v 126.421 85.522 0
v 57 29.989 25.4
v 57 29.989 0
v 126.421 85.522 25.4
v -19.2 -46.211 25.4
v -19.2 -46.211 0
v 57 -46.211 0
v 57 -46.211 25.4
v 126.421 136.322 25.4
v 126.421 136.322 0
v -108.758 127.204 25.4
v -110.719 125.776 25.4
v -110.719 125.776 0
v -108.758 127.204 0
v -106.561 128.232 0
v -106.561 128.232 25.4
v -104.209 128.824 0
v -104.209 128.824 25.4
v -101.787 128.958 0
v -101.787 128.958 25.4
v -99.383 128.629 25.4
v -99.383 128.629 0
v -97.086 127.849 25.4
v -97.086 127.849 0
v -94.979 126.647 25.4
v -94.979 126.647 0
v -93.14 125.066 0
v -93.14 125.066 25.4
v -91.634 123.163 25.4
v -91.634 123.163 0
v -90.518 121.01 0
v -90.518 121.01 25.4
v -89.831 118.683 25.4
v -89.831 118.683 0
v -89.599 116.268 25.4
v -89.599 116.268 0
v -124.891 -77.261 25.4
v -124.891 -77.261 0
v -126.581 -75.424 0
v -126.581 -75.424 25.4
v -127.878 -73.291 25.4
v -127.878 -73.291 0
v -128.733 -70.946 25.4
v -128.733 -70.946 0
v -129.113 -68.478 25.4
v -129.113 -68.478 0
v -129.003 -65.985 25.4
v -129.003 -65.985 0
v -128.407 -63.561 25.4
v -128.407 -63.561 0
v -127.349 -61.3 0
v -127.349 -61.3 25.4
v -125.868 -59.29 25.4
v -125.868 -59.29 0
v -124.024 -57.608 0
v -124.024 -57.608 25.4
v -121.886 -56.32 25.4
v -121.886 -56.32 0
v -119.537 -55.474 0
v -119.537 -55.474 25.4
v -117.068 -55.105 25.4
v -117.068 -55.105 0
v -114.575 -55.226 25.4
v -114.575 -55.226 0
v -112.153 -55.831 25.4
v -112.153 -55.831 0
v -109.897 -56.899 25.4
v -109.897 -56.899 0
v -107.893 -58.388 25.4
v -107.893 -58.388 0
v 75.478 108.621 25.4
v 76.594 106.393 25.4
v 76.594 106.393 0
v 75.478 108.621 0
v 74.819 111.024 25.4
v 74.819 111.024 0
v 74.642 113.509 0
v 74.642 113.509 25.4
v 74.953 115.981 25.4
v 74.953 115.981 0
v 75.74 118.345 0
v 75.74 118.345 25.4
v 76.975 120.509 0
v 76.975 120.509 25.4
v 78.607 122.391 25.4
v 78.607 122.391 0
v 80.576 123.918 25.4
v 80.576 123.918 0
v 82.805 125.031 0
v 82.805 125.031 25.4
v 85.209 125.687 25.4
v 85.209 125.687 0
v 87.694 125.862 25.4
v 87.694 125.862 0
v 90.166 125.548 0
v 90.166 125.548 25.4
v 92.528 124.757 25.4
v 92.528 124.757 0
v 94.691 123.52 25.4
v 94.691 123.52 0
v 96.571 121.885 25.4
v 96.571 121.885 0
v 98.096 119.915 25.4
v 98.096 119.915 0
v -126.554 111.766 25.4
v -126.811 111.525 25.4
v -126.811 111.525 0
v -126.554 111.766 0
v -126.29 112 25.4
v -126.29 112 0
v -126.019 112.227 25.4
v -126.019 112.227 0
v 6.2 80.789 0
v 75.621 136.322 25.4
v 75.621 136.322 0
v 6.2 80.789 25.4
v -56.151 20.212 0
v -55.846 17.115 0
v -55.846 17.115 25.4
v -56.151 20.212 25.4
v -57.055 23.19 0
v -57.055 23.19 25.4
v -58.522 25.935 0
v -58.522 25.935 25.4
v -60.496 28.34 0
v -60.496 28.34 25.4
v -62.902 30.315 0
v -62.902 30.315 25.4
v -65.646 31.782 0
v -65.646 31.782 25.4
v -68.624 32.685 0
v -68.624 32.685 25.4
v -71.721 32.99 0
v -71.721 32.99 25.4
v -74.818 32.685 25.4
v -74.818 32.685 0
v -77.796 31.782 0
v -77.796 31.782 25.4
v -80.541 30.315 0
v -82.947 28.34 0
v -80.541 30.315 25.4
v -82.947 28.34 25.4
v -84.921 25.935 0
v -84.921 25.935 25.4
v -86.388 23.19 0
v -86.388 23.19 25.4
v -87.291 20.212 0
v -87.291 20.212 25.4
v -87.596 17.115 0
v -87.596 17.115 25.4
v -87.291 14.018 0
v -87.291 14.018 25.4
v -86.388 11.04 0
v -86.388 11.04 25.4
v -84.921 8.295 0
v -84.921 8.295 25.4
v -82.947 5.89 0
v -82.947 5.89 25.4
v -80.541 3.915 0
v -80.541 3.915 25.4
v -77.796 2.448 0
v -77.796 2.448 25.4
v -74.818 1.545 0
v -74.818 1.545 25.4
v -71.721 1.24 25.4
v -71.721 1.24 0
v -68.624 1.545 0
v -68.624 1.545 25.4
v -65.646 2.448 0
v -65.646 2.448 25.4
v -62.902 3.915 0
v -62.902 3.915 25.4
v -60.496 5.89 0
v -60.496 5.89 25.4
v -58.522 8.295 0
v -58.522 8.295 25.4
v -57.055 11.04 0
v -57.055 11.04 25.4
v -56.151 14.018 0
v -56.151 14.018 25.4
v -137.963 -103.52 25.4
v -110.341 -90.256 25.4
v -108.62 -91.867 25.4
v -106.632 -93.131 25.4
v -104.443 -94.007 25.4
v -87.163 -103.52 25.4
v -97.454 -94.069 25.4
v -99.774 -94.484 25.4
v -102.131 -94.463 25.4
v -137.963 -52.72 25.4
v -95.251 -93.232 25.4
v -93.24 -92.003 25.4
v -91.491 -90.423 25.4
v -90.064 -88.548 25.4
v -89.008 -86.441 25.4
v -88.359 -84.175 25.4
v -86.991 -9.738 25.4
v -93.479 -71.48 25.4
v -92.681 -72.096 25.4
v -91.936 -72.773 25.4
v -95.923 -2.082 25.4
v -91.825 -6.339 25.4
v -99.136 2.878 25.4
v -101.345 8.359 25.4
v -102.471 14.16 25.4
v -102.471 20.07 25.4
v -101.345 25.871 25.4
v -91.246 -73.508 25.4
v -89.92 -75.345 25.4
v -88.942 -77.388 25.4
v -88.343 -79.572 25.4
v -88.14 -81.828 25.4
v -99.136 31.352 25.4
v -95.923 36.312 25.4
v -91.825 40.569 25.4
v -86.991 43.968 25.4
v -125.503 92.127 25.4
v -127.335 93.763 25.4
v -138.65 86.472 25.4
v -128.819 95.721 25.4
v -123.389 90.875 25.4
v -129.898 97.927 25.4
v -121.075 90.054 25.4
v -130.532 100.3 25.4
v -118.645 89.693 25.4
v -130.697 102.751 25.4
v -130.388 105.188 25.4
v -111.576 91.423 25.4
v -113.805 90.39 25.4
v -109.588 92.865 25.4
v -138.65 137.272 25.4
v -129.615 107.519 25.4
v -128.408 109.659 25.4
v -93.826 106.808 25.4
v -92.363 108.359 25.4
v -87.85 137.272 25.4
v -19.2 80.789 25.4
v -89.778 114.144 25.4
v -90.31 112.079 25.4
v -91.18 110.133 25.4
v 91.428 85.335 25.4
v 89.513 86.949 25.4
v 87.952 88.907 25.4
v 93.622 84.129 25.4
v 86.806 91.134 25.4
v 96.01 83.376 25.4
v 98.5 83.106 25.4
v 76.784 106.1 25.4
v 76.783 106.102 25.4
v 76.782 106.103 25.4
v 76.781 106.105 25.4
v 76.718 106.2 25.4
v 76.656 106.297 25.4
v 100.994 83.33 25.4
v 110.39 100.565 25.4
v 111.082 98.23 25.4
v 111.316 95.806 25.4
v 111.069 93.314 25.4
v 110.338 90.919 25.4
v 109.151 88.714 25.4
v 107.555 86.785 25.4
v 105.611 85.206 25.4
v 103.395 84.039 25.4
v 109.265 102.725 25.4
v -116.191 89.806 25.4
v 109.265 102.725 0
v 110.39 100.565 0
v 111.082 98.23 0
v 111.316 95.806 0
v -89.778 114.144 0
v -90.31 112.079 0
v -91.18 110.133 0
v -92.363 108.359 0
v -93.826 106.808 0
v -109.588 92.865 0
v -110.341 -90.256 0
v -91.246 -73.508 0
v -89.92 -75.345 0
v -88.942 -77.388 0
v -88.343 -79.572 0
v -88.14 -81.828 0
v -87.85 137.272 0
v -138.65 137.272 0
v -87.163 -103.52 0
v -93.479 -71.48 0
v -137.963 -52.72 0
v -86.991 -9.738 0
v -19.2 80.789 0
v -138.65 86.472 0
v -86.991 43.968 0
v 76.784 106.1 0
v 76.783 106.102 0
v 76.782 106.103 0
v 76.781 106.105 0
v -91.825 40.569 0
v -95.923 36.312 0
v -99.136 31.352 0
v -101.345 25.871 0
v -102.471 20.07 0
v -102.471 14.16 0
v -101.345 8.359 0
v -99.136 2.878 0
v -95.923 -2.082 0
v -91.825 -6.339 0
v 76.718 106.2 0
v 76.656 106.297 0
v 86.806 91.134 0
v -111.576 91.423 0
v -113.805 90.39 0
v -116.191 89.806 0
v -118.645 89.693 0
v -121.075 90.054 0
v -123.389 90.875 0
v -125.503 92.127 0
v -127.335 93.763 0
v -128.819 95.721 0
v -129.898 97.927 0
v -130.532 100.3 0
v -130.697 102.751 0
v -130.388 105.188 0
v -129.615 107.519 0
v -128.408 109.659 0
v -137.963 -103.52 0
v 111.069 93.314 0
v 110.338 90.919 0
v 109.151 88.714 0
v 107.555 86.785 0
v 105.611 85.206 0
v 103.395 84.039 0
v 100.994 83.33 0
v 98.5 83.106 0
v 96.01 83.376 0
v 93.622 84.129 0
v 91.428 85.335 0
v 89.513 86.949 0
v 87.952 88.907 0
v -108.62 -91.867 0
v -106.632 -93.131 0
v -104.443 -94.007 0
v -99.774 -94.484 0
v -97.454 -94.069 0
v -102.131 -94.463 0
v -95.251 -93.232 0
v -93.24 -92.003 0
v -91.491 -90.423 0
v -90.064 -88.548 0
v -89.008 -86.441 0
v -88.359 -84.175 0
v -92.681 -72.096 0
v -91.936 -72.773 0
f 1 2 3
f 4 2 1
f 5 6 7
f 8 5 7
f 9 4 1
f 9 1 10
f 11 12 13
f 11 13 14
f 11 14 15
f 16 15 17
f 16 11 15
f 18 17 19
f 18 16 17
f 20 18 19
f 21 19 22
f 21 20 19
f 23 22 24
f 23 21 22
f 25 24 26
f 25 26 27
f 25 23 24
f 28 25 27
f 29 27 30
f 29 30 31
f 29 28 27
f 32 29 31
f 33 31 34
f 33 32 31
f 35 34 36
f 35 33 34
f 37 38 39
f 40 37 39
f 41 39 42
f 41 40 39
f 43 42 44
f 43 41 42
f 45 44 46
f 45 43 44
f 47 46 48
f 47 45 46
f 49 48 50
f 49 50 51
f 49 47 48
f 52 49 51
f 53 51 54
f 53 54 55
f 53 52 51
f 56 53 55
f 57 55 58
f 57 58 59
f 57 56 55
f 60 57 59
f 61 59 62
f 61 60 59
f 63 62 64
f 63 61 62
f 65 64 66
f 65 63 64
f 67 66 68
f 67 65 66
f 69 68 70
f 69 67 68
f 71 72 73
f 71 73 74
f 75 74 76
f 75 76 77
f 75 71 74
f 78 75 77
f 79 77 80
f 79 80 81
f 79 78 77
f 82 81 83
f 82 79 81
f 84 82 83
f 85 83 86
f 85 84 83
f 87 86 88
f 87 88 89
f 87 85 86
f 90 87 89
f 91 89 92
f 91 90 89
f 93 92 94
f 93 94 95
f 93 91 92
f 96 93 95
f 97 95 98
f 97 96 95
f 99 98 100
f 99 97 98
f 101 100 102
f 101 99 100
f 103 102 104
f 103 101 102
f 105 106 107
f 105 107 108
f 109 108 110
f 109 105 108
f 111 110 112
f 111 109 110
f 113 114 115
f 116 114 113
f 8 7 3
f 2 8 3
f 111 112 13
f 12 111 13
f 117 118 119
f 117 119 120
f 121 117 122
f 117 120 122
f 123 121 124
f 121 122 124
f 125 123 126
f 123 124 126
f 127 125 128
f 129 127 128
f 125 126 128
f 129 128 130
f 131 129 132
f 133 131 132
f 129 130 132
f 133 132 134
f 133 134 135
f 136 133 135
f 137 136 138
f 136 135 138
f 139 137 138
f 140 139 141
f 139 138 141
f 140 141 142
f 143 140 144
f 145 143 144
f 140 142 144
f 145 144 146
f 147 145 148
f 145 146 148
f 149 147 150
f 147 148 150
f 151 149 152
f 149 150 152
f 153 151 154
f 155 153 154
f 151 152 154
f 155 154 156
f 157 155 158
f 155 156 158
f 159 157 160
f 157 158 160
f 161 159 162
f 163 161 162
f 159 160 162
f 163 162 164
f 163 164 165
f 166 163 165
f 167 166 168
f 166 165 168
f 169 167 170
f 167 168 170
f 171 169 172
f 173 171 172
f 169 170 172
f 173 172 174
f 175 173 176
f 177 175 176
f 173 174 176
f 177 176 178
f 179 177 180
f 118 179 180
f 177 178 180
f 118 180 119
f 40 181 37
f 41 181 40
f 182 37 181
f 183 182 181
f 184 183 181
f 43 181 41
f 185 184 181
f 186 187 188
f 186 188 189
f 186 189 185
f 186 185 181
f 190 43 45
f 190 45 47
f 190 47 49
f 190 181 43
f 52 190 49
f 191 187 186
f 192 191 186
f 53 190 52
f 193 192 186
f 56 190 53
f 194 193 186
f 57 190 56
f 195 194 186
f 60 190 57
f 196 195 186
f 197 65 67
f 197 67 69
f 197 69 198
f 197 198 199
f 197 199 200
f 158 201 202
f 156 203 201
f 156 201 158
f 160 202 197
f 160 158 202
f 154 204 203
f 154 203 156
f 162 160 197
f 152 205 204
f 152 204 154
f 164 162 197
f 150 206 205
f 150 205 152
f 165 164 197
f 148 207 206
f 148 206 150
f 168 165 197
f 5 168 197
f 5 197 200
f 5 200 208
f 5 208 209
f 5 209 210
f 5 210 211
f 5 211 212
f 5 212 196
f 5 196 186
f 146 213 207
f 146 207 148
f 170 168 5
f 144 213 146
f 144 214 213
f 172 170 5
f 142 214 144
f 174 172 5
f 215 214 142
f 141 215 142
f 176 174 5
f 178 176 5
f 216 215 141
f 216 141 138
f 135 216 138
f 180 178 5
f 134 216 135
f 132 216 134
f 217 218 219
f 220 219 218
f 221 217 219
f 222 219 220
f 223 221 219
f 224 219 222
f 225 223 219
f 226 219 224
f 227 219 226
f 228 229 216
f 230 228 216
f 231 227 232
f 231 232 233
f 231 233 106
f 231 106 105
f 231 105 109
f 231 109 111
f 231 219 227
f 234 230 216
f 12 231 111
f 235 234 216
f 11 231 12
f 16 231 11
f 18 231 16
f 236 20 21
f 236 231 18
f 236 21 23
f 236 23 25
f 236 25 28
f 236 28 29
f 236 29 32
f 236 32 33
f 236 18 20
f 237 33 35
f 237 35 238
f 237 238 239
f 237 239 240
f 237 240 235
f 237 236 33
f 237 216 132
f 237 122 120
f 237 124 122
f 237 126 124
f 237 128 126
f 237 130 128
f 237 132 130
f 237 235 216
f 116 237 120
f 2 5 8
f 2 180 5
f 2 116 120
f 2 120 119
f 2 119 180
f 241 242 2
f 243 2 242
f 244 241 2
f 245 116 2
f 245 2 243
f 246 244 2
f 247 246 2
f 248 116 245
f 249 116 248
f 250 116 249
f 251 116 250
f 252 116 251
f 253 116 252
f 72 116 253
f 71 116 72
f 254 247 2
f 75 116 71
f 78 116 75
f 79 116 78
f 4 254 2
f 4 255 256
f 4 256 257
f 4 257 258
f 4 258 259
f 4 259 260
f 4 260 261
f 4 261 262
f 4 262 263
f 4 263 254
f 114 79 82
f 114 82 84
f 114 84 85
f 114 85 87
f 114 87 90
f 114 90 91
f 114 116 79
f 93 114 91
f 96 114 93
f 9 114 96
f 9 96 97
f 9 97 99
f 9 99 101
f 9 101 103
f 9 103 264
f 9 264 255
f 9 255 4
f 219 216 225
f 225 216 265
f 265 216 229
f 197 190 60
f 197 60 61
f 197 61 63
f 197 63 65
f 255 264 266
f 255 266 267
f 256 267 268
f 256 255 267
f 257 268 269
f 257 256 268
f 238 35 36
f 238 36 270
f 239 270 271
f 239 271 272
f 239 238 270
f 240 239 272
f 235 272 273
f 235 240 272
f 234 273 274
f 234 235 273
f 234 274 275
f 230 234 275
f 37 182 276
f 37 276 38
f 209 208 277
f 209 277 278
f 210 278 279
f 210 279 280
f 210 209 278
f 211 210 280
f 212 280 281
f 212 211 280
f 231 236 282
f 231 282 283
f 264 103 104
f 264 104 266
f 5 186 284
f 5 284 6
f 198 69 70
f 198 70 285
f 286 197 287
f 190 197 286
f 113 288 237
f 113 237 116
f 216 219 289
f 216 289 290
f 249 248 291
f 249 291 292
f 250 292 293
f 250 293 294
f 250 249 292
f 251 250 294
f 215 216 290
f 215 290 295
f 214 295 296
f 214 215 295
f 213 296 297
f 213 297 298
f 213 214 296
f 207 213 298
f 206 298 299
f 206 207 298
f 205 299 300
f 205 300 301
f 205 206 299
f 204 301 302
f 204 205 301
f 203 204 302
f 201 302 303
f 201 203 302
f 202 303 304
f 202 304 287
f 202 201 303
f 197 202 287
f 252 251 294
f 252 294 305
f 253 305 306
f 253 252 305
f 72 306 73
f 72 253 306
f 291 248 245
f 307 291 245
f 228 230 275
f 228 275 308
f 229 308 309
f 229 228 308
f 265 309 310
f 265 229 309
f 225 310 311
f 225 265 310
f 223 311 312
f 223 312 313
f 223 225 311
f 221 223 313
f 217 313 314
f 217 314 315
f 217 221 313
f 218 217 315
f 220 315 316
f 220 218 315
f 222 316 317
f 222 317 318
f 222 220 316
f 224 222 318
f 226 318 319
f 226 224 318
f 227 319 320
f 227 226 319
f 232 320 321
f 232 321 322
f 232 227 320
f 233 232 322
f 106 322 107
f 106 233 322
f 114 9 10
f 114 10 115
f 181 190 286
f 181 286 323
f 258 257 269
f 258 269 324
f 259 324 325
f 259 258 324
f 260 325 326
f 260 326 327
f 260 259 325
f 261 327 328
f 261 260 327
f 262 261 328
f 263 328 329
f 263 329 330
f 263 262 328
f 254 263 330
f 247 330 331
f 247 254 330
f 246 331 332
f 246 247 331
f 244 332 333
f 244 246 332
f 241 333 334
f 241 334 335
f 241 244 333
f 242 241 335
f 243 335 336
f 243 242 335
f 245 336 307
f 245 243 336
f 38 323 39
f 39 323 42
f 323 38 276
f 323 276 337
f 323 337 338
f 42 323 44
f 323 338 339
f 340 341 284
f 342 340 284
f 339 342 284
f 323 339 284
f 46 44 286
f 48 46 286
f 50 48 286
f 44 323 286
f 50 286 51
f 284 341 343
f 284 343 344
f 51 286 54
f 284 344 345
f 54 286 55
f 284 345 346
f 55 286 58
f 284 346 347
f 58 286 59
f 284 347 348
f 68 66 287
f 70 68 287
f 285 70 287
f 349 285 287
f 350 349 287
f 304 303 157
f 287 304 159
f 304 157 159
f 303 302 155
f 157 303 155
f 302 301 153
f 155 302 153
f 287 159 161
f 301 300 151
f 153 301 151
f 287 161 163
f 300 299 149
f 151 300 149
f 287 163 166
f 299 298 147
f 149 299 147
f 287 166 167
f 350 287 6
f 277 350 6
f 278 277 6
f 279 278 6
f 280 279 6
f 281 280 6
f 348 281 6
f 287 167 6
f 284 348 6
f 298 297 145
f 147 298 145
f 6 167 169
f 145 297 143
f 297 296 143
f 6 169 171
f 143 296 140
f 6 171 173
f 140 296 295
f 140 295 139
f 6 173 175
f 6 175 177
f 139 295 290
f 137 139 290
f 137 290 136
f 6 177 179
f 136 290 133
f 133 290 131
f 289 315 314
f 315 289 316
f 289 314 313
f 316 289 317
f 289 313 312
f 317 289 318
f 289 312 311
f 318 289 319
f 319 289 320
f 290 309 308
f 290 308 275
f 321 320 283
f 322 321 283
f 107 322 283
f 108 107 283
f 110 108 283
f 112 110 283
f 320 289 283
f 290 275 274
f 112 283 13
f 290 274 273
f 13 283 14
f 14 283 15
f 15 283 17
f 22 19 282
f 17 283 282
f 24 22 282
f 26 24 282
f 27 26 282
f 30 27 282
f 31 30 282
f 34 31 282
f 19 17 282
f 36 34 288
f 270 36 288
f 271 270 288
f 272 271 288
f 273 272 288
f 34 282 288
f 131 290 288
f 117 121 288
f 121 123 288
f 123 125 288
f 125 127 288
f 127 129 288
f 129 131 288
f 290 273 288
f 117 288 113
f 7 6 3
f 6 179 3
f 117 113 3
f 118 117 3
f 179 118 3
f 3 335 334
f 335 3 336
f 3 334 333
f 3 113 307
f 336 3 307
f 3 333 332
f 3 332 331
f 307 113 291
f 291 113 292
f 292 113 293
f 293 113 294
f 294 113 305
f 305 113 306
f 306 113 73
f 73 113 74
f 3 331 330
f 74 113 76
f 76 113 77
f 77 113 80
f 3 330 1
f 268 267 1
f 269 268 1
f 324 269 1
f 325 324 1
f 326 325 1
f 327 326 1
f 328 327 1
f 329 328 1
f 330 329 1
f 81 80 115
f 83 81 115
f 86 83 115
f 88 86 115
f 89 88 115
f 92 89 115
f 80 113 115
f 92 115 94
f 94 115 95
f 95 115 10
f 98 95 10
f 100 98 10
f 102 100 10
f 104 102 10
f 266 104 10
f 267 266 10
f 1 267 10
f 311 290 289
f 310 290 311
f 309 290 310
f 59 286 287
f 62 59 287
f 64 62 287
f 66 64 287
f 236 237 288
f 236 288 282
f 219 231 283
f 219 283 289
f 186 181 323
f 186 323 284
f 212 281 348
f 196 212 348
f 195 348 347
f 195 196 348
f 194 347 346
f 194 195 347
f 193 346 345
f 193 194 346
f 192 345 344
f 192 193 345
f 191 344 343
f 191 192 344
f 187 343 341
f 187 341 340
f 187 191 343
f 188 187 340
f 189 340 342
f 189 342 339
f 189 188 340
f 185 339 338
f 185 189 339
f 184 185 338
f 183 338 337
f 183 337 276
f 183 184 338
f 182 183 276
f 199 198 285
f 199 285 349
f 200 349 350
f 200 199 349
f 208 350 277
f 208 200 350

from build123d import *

# Parameters (mm, degrees)
F0_W      = 127
F0_H      = 127
F1_DEPTH  = 25.4
F3_DEPTH  = 25.4
F5_DEPTH  = 25.4
F7_DEPTH  = 25.4
F8_R      = 15.875
F9_DEPTH  = 25.4
F11_DEPTH = 25.4
F13_DEPTH = 25.4
F15_DEPTH = 25.4


with BuildPart() as f1:
    # F0 (on Top) → F1 (new body)
    with BuildSketch(Plane.XY):
        with Locations((-6.4998464659, 17.2889307044)):
            Rectangle(F0_W, F0_H)
    extrude(amount=F1_DEPTH)

    # F2 (on face) → F3 (join)
    with BuildSketch(Plane.XY.offset(25.4)):
        Polygon((-69.9998464659, 80.7889307044), (-19.1998464659, 80.7889307044), (-87.8500497752, 137.2721988958), (-138.6500497752, 137.2721988958), (-138.6500497752, 86.4721988958), (-69.9998464659, 29.9889307044), align=None)
        with BuildLine():
            ThreePointArc((-109.5878779442, 92.8645576236), (-127.335300057, 93.7629034767), (-126.8113794505, 111.5253223468))
            ThreePointArc((-126.8113794505, 111.5253223468), (-126.4226968944, 111.8842534225), (-126.0194023679, 112.2266846875))
            Line((-126.0194023679, 112.2266846875), (-110.7193396489, 125.7761775168))
            ThreePointArc((-110.7193396489, 125.7761775168), (-97.0861443246, 127.8491270452), (-89.5994854861, 116.268493473))
            ThreePointArc((-89.5994854861, 116.268493473), (-90.7041997852, 111.087822714), (-93.8261547008, 106.8084371623))
            Line((-93.8261547008, 106.8084371623), (-109.5878779442, 92.8645576236))
        make_face(mode=Mode.SUBTRACT)
    extrude(amount=-F3_DEPTH)

    # F4 (on face) → F5 (join)
    with BuildSketch(Plane.XY.offset(25.4)):
        Polygon((-19.1998464659, -46.2110692956), (-69.9998464659, -46.2110692956), (-69.9998464659, 4.5889307044), (-137.9625790448, -52.7196810429), (-137.9625790448, -103.5196810429), (-87.1625790448, -103.5196810429), align=None)
        with BuildLine():
            ThreePointArc((-124.8913826642, -77.2612392483), (-125.8684271298, -59.289751867), (-107.8930110557, -58.387869642))
            Line((-107.8930110557, -58.387869642), (-93.478630305, -71.4798248269))
            ThreePointArc((-93.478630305, -71.4798248269), (-92.3018338966, -72.4272635432), (-91.2458718834, -73.5077422033))
            ThreePointArc((-91.2458718834, -73.5077422033), (-88.9421307344, -77.38777287), (-88.1404826535, -81.8284058891))
            ThreePointArc((-88.1404826535, -81.8284058891), (-96.3332021363, -93.7016709135), (-110.3411790849, -90.2561438606))
            Line((-110.3411790849, -90.2561438606), (-124.8913826642, -77.2612392483))
        make_face(mode=Mode.SUBTRACT)
    extrude(amount=-F5_DEPTH)

    # F6 (on face) → F7 (join)
    with BuildSketch(Plane.XY.offset(25.4)):
        with BuildLine():
            Line((-86.9905296106, -9.7382222324), (-69.9998464659, 4.5889307044))
            Line((-69.9998464659, 4.5889307044), (-69.9998464659, 29.9889307044))
            Line((-69.9998464659, 29.9889307044), (-86.9905296106, 43.9683403282))
            ThreePointArc((-86.9905296106, 43.9683403282), (-102.6121797634, 17.1150590479), (-86.9905296106, -9.7382222324))
        make_face()
    extrude(amount=-F7_DEPTH)

    # F8 (on face) → F9 (cut)
    with BuildSketch(Plane.XY.offset(25.4)):
        with Locations((-71.7212476412, 17.1150590479)):
            Circle(F8_R)
    extrude(amount=-F9_DEPTH, mode=Mode.SUBTRACT)

    # F10 (on face) → F11 (join)
    with BuildSketch(Plane.XY.offset(25.4)):
        Polygon((6.2001535341, 80.7889307044), (57.0001535341, 80.7889307044), (57.0001535341, 29.9889307044), (126.4214329, 85.5217675778), (126.4214329, 136.3217675778), (75.6214329, 136.3217675778), align=None)
        with BuildLine():
            ThreePointArc((76.5939625601, 106.3933075608), (80.5762417258, 123.917512433), (98.0957891705, 119.9147932213))
            Line((98.0957891705, 119.9147932213), (109.2649622488, 102.7253014109))
            ThreePointArc((109.2649622488, 102.7253014109), (110.7921511376, 99.4142259228), (111.3155970742, 95.8056900505))
            ThreePointArc((111.3155970742, 95.8056900505), (96.237535273, 83.330321436), (86.8061762759, 100.4776896661))
            ThreePointArc((86.8061762759, 100.4776896661), (81.1206145534, 102.0919953506), (76.7813723772, 106.1047964024))
            ThreePointArc((76.7813723772, 106.1047964024), (76.6866904713, 106.2484173479), (76.5939625601, 106.3933075608))
        make_face(mode=Mode.SUBTRACT)
    extrude(amount=-F11_DEPTH)

    # F12 (on face) → F13 (cut)
    with BuildSketch(Plane.XY.offset(25.4)):
        with BuildLine():
            Line((-19.1998464659, 80.7889307044), (6.2001535341, 80.7889307044))
            Line((6.2001535341, 80.7889307044), (23.852505554, 94.9097477523))
            ThreePointArc((23.852505554, 94.9097477523), (-6.2549458696, 107.6316508681), (-36.3623972932, 94.9097477523))
            Line((-36.3623972932, 94.9097477523), (-19.1998464659, 80.7889307044))
        make_face()
    extrude(amount=-F13_DEPTH, mode=Mode.SUBTRACT)

    # F14 (on face) → F15 (cut)
    with BuildSketch(Plane.XY.offset(25.4)):
        with BuildLine():
            Line((76.7843086706, 106.1004093518), (86.8061762759, 91.133690435))
            ThreePointArc((86.8061762759, 91.133690435), (85.9155970742, 95.8056900505), (86.8061762759, 100.4776896661))
            ThreePointArc((86.8061762759, 100.4776896661), (81.1229163803, 102.0907036074), (76.7843086706, 106.1004093518))
        make_face()
    extrude(amount=-F15_DEPTH, mode=Mode.SUBTRACT)


solid = f1.part
